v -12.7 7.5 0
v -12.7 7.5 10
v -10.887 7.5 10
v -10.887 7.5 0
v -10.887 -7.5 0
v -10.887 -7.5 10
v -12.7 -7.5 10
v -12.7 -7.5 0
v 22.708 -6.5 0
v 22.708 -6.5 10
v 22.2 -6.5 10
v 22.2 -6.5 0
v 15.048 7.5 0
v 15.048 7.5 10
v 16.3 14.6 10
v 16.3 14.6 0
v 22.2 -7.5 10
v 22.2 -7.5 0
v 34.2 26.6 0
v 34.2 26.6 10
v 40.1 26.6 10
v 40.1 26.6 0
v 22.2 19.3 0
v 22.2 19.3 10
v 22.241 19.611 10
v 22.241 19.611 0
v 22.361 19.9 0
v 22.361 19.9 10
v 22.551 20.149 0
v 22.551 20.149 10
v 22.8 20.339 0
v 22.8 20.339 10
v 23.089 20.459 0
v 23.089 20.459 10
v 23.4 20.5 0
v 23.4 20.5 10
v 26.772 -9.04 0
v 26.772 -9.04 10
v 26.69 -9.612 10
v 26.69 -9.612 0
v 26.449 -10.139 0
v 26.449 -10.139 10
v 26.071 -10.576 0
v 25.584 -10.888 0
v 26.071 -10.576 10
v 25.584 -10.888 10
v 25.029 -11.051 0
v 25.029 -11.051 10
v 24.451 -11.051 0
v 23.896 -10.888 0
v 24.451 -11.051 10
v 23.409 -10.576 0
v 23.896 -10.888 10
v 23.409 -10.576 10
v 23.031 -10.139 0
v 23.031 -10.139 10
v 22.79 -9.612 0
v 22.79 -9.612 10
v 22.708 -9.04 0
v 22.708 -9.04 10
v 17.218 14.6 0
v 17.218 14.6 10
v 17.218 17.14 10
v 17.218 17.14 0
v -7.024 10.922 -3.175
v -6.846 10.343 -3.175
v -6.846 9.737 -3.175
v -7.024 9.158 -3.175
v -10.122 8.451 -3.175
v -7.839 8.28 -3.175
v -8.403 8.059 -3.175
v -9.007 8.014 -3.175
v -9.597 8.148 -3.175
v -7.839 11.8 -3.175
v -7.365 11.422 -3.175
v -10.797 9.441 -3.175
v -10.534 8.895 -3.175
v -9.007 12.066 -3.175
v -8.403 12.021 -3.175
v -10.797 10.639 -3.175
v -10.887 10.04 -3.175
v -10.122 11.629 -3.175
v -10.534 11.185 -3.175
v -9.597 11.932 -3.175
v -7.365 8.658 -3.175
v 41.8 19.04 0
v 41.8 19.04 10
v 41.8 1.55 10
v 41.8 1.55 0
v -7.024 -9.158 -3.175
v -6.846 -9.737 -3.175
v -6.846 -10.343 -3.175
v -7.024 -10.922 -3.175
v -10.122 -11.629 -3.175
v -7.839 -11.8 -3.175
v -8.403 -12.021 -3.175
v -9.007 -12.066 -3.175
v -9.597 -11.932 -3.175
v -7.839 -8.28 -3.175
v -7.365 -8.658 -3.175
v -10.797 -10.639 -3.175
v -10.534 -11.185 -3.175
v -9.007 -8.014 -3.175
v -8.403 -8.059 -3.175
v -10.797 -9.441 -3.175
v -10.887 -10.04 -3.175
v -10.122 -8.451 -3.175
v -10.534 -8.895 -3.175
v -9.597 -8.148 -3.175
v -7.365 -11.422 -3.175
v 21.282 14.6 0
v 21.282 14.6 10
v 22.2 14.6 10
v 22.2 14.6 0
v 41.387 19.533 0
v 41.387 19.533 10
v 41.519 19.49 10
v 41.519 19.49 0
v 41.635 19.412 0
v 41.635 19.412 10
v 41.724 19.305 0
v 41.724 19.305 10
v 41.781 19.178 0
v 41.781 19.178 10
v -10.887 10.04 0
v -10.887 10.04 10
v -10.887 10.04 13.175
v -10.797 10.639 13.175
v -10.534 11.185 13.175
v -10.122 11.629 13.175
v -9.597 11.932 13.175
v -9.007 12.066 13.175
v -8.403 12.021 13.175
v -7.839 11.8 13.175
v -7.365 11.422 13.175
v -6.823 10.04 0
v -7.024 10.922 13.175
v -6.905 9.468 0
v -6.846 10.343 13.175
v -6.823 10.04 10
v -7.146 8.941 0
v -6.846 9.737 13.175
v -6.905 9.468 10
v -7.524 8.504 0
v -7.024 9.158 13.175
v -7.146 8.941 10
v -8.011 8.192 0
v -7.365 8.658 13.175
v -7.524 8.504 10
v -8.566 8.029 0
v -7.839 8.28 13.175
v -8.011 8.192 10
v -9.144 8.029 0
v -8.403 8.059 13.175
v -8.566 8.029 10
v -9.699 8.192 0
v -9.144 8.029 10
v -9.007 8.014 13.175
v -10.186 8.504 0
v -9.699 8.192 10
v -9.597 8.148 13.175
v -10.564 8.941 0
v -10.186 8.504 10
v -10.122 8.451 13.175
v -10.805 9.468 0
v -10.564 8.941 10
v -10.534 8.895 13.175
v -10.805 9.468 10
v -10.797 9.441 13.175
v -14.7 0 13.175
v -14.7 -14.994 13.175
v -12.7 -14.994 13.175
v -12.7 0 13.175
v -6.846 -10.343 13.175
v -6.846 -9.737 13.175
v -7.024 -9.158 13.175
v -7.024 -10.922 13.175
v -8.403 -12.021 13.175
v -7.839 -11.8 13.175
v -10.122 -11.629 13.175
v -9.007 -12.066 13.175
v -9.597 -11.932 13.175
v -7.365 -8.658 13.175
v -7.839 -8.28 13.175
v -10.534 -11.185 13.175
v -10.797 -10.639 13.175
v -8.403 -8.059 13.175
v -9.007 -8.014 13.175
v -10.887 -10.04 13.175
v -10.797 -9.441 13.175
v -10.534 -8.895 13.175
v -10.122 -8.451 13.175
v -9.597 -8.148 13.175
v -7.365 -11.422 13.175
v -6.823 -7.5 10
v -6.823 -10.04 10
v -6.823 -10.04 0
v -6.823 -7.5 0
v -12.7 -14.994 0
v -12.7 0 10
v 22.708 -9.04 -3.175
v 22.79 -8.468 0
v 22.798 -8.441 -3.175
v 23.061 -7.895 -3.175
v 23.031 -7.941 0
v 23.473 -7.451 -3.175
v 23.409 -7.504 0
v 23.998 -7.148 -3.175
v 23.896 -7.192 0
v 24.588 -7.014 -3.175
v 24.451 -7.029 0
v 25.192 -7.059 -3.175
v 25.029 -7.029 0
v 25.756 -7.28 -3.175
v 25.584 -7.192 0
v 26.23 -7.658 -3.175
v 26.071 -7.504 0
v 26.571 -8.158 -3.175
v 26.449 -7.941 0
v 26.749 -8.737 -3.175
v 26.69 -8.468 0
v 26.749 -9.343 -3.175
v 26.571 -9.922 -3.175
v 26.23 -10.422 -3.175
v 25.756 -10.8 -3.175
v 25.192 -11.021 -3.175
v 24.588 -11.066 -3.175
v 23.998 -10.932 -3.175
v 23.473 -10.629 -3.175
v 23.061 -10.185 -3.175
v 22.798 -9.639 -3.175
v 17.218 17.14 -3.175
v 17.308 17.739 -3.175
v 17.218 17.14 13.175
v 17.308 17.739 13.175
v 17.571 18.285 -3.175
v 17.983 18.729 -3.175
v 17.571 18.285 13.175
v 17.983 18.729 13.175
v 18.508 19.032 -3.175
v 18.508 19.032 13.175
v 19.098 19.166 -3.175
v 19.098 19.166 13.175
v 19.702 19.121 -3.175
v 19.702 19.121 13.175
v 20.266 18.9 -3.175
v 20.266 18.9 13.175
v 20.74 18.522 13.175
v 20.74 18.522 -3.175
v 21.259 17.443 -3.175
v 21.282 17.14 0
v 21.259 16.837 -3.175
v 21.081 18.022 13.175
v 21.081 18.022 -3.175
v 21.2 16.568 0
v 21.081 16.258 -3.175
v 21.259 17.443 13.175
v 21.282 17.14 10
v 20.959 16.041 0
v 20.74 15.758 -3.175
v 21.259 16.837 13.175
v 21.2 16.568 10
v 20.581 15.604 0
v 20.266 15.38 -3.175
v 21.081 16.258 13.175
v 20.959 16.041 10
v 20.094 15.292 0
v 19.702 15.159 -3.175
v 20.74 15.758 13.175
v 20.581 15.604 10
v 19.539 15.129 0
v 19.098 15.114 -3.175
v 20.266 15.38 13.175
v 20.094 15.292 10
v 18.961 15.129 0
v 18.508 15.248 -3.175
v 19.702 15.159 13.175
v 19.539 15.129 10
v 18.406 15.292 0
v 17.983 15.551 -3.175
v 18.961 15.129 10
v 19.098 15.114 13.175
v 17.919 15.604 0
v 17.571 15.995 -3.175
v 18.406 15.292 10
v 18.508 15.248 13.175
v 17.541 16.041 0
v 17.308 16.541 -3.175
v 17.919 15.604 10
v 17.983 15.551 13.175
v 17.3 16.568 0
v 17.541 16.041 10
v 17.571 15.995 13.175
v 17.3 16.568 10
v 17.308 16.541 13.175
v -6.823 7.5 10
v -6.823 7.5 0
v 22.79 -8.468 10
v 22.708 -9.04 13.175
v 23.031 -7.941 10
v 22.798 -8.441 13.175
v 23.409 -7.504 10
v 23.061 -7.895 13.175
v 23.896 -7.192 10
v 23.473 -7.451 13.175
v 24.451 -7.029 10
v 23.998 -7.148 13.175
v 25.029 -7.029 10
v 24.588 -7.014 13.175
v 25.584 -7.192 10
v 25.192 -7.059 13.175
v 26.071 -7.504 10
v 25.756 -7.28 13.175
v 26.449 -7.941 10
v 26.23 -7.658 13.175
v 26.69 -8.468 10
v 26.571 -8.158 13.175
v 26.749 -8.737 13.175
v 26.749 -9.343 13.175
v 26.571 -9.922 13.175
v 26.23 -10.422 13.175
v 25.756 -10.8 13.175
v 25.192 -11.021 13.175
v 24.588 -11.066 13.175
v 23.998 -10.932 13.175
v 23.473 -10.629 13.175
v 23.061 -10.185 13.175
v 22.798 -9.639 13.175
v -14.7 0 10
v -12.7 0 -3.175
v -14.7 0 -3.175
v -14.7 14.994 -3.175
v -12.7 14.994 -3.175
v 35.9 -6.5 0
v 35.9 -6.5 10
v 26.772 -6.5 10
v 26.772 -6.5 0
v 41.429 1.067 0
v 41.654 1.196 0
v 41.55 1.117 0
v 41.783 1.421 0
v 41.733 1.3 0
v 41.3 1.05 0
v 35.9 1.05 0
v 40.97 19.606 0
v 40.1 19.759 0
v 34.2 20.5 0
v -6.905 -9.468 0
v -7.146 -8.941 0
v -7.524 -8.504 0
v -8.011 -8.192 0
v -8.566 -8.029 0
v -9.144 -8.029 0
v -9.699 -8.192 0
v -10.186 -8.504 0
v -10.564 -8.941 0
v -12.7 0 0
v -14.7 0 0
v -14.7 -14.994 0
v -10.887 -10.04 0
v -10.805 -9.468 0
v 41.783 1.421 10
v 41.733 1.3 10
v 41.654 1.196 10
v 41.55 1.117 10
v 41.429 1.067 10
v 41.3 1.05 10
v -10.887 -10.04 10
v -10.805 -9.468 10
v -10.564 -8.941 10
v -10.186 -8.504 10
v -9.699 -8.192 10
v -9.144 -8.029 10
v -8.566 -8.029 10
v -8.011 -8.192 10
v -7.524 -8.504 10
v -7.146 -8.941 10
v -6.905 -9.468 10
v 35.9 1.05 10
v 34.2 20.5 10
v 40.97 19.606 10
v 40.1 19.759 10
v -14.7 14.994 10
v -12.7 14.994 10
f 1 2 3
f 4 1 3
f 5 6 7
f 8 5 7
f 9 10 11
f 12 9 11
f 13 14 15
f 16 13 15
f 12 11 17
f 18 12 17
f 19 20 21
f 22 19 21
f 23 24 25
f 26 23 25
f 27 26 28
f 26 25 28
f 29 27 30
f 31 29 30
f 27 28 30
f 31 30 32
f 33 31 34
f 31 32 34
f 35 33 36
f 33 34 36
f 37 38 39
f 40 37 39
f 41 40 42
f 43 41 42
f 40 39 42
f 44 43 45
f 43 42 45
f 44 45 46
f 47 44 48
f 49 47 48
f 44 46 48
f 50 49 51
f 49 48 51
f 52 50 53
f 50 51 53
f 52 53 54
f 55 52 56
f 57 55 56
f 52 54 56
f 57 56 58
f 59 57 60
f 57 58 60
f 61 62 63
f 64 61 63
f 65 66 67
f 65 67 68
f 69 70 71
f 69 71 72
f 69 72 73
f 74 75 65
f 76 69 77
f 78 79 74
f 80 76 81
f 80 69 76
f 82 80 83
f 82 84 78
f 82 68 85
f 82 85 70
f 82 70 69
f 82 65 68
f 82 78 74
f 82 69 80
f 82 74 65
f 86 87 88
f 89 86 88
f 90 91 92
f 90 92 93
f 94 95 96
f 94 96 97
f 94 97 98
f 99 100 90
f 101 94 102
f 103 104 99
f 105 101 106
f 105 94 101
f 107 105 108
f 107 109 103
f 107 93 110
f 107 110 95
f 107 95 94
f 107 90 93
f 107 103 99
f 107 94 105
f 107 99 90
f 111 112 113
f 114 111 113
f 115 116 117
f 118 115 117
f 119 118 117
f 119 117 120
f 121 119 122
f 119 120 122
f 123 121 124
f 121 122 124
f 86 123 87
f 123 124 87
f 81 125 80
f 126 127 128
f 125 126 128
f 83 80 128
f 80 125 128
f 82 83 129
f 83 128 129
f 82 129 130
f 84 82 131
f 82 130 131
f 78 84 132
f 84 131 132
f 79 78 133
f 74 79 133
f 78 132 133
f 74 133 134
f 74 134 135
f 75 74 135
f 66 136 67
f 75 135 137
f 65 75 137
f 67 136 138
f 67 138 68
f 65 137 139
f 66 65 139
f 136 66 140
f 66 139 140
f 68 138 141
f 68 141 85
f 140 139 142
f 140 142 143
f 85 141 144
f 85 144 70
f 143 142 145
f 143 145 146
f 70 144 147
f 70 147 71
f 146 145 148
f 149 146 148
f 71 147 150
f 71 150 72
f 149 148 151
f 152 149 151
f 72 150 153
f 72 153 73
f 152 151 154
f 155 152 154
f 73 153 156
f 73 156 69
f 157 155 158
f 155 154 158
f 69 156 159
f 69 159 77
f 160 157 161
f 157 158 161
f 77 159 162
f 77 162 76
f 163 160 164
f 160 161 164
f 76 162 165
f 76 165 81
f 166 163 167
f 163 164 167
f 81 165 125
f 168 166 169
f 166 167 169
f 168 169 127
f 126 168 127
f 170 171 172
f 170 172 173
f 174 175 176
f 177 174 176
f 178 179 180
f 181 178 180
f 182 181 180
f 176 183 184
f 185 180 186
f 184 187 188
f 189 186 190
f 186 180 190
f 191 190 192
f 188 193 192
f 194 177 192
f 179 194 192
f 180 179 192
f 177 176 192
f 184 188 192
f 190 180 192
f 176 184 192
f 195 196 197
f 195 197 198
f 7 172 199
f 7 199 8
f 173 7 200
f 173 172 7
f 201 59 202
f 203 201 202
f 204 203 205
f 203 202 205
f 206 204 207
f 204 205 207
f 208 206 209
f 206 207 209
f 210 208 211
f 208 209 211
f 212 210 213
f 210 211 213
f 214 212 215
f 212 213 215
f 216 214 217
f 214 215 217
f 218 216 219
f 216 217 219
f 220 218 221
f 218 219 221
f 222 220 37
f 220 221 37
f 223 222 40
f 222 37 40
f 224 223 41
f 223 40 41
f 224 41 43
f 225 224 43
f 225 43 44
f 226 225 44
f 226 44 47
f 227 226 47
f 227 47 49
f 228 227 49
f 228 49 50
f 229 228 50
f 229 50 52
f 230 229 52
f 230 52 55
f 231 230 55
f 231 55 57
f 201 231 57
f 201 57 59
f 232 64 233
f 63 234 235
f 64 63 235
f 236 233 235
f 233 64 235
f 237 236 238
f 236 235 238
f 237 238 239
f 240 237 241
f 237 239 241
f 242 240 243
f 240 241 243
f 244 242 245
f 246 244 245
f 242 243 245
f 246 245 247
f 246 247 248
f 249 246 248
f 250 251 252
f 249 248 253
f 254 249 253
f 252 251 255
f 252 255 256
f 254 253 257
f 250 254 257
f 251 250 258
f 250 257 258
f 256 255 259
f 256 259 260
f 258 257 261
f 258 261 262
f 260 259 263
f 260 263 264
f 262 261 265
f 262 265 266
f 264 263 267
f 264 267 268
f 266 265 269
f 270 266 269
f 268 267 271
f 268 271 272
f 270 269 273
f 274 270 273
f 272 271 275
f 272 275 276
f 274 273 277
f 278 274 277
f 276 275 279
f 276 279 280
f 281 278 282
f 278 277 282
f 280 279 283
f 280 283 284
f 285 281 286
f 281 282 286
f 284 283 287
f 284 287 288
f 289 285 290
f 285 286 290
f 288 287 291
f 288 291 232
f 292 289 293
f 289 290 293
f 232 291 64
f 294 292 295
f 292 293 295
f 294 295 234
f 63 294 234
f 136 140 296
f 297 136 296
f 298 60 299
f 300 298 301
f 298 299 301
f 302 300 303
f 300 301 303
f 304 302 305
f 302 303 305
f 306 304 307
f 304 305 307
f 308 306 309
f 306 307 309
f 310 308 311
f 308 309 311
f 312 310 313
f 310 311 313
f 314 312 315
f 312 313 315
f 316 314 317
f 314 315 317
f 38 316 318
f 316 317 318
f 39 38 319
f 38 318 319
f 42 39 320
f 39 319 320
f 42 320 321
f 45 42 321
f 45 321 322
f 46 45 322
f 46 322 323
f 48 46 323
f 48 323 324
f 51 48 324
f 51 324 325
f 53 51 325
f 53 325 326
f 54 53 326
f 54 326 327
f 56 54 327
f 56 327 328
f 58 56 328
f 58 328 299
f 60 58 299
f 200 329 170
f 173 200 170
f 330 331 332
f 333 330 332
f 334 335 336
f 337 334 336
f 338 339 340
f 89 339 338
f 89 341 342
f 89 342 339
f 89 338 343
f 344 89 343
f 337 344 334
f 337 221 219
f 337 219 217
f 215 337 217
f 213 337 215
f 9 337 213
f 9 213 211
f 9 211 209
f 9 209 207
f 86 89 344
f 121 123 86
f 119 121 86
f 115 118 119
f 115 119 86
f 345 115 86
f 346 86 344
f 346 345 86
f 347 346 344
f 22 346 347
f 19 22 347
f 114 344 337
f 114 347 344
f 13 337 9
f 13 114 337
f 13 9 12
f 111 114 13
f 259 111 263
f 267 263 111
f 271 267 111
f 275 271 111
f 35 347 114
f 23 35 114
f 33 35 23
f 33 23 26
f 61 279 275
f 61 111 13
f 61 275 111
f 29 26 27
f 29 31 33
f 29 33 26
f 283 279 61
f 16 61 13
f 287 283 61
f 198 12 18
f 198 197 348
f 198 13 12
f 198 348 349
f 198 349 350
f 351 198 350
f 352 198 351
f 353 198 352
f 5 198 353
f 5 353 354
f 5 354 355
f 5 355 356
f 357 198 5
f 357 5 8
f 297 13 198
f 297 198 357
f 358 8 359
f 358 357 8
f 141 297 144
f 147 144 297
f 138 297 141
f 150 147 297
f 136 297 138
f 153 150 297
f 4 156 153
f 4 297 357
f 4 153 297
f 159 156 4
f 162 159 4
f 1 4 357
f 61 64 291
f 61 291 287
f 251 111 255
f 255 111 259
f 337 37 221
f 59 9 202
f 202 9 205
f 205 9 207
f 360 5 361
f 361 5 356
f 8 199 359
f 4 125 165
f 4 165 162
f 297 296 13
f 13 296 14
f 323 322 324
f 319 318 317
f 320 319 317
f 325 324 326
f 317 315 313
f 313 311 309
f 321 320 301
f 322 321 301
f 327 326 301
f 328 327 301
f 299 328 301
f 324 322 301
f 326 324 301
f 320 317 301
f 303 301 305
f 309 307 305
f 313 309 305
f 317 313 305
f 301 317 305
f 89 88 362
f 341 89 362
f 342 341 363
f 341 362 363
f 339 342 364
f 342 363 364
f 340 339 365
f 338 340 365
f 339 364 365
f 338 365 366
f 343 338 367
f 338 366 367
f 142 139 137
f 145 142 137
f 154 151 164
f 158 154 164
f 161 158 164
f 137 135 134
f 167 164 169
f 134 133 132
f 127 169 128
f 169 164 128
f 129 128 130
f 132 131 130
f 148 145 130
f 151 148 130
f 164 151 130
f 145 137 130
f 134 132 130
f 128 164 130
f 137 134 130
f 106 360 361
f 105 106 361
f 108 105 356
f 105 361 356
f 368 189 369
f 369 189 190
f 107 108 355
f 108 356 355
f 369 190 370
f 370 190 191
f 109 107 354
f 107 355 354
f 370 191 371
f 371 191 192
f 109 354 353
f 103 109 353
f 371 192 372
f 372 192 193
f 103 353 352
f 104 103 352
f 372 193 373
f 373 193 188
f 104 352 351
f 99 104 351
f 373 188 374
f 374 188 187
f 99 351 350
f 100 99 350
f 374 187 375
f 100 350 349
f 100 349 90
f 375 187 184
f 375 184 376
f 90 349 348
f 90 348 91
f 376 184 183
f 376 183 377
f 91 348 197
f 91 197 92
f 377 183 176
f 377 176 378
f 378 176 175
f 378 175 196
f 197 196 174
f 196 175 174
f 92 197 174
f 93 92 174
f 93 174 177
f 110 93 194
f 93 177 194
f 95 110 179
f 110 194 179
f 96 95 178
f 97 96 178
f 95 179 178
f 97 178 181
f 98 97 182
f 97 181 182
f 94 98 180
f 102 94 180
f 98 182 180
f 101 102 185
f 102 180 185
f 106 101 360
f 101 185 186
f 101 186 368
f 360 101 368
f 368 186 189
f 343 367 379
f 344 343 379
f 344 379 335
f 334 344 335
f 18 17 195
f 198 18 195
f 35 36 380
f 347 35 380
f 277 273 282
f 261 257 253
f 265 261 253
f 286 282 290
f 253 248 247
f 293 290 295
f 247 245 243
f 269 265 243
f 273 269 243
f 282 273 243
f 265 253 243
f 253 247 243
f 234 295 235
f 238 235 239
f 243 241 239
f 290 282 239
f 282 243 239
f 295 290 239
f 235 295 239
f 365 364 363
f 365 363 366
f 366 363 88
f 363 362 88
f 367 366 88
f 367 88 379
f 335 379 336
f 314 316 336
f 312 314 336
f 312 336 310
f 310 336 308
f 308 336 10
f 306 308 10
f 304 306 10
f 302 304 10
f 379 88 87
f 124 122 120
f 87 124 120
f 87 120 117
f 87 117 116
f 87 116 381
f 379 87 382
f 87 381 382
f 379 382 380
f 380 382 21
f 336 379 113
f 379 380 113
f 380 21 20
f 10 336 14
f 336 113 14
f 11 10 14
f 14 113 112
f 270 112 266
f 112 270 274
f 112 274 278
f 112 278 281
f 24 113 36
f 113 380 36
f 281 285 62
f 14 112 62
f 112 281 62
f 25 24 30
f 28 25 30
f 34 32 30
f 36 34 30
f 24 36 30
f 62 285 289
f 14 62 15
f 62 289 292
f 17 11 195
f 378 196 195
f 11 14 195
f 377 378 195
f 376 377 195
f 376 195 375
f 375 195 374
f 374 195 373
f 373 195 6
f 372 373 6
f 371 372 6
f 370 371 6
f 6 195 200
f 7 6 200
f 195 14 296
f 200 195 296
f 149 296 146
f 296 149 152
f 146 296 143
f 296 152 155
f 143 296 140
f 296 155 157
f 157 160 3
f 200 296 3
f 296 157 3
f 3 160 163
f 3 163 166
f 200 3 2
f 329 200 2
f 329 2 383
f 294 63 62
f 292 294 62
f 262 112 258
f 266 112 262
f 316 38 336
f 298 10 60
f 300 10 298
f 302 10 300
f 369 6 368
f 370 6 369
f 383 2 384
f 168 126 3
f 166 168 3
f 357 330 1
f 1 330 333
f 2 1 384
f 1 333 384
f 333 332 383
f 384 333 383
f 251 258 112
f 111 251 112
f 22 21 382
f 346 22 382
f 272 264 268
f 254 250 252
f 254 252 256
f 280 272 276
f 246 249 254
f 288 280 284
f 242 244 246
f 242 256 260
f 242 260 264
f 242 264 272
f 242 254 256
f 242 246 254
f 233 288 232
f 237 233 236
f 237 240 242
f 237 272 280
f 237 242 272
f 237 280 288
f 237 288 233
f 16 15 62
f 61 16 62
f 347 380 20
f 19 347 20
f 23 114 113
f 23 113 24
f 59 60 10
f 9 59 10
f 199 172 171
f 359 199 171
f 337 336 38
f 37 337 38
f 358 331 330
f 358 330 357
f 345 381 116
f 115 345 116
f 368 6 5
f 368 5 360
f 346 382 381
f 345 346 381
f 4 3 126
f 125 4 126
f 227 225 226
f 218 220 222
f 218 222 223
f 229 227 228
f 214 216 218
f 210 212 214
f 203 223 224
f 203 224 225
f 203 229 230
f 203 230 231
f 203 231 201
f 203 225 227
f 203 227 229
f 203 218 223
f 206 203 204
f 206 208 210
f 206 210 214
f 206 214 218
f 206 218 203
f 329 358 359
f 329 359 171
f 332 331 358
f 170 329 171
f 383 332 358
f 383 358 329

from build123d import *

# Parameters (mm, degrees)
SKETCH1_W                = 25.4
SKETCH1_H                = 15
BOSS_EXTRUDE1_DEPTH      = 10
BOSS_EXTRUDE2_DEPTH      = 10
SKETCH3_W                = 3.175
SKETCH3_H                = 14.99375
BOSS_EXTRUDE3_DEPTH      = 2
BOSS_EXTRUDE6_DEPTH      = 10
BOSS_EXTRUDE7_DEPTH      = 3.175
BOSS_EXTRUDE7_DEPTH_BACK = 13.175
SKETCH7_R                = 2.032


with BuildPart() as part:
    # Sketch1 → Boss-Extrude1 (new body)
    with BuildSketch(Plane.XY):
        Rectangle(SKETCH1_W, SKETCH1_H)
    extrude(amount=BOSS_EXTRUDE1_DEPTH)

    # Sketch2 → Boss-Extrude2 (add)
    with BuildSketch(Plane.XY.offset(10)):
        with BuildLine():
            Line((40.1, 19.759426681), (40.970013246, 19.606019872))
            Line((40.970013246, 19.606019872), (41.386824089, 19.532524875))
            ThreePointArc((41.386824089, 19.532524875), (41.683022222, 19.361514803), (41.8, 19.040120998))
            Line((41.8, 19.040120998), (41.8, 1.55))
            ThreePointArc((41.8, 1.55), (41.653553391, 1.196446609), (41.3, 1.05))
            Line((41.3, 1.05), (40.883189158, 1.05))
            Line((40.883189158, 1.05), (35.9, 1.05))
            Line((35.9, 1.05), (35.9, -2.35))
            Line((35.9, -2.35), (35.9, -6.5))
            Line((35.9, -6.5), (34.9, -6.5))
            Line((34.9, -6.5), (22.2, -6.5))
            Line((22.2, -6.5), (22.2, -7.5))
            Line((22.2, -7.5), (9.4, -7.5))
            Line((9.4, -7.5), (9.4, 7.5))
            Line((9.4, 7.5), (15.048, 7.5))
            Line((15.048, 7.5), (16.3, 14.6))
            Line((16.3, 14.6), (22.2, 14.6))
            Line((22.2, 14.6), (22.2, 19.3))
            ThreePointArc((22.2, 19.3), (22.551471863, 20.148528137), (23.4, 20.5))
            Line((23.4, 20.5), (34.2, 20.5))
            Line((34.2, 20.5), (34.2, 26.6))
            Line((34.2, 26.6), (40.1, 26.6))
            Line((40.1, 26.6), (40.1, 19.759426681))
        make_face()
        Polygon((-14.7, 14.2), (-14.7, 14.99375), (-12.7, 14.99375), (-12.7, 14.2), (-12.7, 12.710514427), (-12.7, 7.5), (-12.7, 0), (-12.7, -10.069090909), (-12.7, -14.2), (-12.7, -14.99375), (-14.7, -14.99375), (-14.7, -14.2), (-14.7, -10.069090909), (-14.7, 0), (-14.7, 7.5), (-14.7, 11), align=None)
    extrude(amount=-BOSS_EXTRUDE2_DEPTH)

    # Sketch3 → Boss-Extrude3 (add)
    with BuildSketch(Plane.ZY.offset(14.7)):
        with Locations((-1.5875, 7.496875)):
            Rectangle(SKETCH3_W, SKETCH3_H)
        with Locations((11.5875, -7.496875)):
            Rectangle(SKETCH3_W, SKETCH3_H)
    extrude(amount=-BOSS_EXTRUDE3_DEPTH)

    # Sketch6 → Boss-Extrude6 (add)
    with BuildSketch(Plane.XY.offset(10)):
        with BuildLine():
            Line((-10.887, 7.5), (-10.887, 10.04))
            ThreePointArc((-10.887, 10.04), (-8.855, 12.072), (-6.823, 10.04))
            Line((-6.823, 10.04), (-6.823, 7.5))
            ThreePointArc((-6.823, 7.5), (-8.855, 5.468), (-10.887, 7.5))
        make_face()
        with BuildLine():
            Line((-10.887, -7.5), (-10.887, -10.04))
            ThreePointArc((-10.887, -10.04), (-8.855, -12.072), (-6.823, -10.04))
            Line((-6.823, -10.04), (-6.823, -7.5))
            ThreePointArc((-6.823, -7.5), (-8.855, -5.468), (-10.887, -7.5))
        make_face()
        with BuildLine():
            Line((17.218, 14.6), (17.218, 17.14))
            ThreePointArc((17.218, 17.14), (19.25, 19.172), (21.282, 17.14))
            Line((21.282, 17.14), (21.282, 14.6))
            ThreePointArc((21.282, 14.6), (19.25, 12.568), (17.218, 14.6))
        make_face()
        with BuildLine():
            Line((26.772, -6.5), (26.772, -9.04))
            ThreePointArc((26.772, -9.04), (24.74, -11.072), (22.708, -9.04))
            Line((22.708, -9.04), (22.708, -6.5))
            ThreePointArc((22.708, -6.5), (24.74, -4.468), (26.772, -6.5))
        make_face()
    extrude(amount=-BOSS_EXTRUDE6_DEPTH)

    # Sketch7 → Boss-Extrude7 (add, two sides: drawn at the far end of the back side and taken through both)
    with BuildSketch(Plane(origin=(0, 0, 0), x_dir=(-1, 0, 0), z_dir=(0, 0, -1)).offset(-BOSS_EXTRUDE7_DEPTH_BACK)):
        with Locations((-19.25, 17.14)):
            Circle(SKETCH7_R)
        with Locations((-24.74, -9.04)):
            Circle(SKETCH7_R)
        with Locations((8.855, -10.04)):
            Circle(SKETCH7_R)
        with Locations((8.855, 10.04)):
            Circle(SKETCH7_R)
    extrude(amount=BOSS_EXTRUDE7_DEPTH + BOSS_EXTRUDE7_DEPTH_BACK)


solid = part.part
